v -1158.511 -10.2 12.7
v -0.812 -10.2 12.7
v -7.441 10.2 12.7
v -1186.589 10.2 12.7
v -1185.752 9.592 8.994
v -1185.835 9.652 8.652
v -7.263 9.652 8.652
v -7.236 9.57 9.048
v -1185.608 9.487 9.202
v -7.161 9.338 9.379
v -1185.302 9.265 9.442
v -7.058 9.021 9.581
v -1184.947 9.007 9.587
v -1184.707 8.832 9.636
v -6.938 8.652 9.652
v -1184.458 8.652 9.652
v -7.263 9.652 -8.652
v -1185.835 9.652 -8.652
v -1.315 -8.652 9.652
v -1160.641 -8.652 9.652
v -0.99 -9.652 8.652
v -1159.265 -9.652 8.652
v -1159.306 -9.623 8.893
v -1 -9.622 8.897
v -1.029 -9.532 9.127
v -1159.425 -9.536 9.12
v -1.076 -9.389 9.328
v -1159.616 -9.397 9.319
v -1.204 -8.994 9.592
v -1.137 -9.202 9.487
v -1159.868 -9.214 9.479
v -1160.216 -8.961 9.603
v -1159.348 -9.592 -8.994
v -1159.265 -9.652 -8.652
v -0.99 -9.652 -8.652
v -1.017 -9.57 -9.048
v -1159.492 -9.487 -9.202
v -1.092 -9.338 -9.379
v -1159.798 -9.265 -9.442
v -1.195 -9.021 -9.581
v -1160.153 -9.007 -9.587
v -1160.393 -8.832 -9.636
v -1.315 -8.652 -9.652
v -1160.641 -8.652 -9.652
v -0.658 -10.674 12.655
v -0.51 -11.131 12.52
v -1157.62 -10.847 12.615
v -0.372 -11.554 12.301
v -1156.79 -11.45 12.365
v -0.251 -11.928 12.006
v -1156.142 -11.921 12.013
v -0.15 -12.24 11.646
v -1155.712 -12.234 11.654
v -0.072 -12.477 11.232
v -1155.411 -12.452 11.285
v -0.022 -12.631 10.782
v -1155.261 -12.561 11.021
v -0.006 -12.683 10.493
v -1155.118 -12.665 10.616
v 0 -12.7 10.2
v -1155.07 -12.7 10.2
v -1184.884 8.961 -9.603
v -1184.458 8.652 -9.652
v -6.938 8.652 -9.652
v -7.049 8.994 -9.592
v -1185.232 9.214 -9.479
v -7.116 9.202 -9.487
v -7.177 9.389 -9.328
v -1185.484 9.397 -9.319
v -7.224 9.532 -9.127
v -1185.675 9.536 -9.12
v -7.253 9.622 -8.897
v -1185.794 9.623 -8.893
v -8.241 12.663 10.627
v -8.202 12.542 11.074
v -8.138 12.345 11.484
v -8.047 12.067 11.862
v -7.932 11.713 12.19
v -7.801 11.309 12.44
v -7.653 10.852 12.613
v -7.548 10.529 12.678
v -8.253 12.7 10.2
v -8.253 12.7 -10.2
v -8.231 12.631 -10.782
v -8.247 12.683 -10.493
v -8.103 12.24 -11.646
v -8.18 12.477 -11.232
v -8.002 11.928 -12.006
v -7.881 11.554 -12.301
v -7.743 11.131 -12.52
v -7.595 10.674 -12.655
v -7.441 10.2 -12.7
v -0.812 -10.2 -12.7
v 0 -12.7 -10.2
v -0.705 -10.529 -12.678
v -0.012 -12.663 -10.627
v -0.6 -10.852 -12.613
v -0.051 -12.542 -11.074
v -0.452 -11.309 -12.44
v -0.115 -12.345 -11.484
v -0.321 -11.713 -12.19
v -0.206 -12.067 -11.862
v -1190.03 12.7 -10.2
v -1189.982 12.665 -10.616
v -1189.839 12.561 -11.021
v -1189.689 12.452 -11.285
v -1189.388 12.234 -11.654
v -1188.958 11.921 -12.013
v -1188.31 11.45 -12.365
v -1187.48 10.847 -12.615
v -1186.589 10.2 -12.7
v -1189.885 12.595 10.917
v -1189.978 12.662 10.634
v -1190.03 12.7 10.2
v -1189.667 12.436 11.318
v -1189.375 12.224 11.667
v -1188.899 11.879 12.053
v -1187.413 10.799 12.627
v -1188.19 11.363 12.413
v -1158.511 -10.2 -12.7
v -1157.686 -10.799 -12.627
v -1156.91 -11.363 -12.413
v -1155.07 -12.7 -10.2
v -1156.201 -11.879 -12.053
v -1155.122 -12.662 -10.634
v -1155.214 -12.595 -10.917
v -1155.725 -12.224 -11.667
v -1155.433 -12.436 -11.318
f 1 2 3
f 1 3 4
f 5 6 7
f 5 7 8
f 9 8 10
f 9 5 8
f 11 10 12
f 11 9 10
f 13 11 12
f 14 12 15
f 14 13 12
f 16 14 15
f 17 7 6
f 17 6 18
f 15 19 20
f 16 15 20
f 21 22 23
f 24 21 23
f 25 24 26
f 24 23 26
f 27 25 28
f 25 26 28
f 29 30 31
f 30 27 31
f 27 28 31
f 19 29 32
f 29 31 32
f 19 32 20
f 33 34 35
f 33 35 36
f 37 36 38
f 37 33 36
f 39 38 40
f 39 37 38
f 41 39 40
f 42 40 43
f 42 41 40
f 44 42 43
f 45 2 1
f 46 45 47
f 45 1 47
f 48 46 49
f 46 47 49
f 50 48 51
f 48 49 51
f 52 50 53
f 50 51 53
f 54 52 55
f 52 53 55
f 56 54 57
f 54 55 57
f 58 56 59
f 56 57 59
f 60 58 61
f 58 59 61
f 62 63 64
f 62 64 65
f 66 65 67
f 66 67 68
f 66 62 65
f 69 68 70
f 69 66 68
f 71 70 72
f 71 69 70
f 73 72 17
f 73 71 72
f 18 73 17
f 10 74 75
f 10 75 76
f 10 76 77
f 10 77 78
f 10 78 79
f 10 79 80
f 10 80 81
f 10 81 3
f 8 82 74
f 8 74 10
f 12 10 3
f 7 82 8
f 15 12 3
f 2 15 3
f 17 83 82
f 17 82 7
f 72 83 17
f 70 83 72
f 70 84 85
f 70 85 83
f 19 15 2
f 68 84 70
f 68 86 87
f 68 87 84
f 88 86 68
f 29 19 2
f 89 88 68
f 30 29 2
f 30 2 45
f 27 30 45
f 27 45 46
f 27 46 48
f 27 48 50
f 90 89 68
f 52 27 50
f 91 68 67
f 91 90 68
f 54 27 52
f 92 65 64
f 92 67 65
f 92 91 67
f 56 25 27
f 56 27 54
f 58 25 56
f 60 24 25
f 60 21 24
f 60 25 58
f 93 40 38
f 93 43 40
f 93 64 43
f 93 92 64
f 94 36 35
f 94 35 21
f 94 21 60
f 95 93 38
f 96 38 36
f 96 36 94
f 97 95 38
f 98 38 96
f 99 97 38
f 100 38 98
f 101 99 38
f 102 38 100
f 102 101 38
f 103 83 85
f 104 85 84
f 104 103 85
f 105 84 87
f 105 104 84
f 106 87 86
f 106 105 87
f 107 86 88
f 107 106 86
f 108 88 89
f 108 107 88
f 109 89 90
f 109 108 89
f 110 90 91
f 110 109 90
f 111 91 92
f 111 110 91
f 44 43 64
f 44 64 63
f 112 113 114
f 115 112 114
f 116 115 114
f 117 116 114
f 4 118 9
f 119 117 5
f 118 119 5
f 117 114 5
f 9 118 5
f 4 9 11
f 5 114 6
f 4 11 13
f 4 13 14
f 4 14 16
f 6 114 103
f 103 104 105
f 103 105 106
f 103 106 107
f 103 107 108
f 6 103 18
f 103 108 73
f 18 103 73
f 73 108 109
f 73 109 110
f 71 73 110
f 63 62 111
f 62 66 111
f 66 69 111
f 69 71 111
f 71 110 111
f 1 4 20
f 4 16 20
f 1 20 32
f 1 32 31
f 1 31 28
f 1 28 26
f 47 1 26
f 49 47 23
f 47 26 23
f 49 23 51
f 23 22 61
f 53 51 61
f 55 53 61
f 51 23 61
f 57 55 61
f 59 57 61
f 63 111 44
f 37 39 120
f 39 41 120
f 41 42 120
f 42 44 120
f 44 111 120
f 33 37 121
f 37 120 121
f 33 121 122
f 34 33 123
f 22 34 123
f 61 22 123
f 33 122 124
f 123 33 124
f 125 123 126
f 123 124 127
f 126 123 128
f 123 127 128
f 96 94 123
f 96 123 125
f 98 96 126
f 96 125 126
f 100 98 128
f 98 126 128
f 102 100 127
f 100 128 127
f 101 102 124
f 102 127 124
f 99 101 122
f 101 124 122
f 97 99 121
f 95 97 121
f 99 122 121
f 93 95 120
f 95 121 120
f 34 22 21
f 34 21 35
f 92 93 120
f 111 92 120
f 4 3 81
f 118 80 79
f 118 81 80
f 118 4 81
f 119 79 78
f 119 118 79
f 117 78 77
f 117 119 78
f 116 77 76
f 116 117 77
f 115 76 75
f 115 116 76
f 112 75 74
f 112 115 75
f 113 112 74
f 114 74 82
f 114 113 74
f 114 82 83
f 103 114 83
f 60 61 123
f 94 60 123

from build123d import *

# Parameters (mm, degrees)
SKETCH3_W           = 25.4
SKETCH3_H           = 25.4
SKETCH3_W_2         = 19.304
SKETCH3_H_2         = 19.304
BOSS_EXTRUDE1_DEPTH = 1190.03
FILLET1_R           = 2.5
FILLET2_R           = 1
CUT_EXTRUDE1_DEPTH  = 1191.368787771


with BuildPart() as part:
    # Sketch3 → Boss-Extrude1 (new body)
    with BuildSketch(Plane(origin=(0, 0, 0), x_dir=(0, 0, -1), z_dir=(1, 0, 0))):
        Rectangle(SKETCH3_W, SKETCH3_H)
        Rectangle(SKETCH3_W_2, SKETCH3_H_2, mode=Mode.SUBTRACT)
    extrude(amount=-BOSS_EXTRUDE1_DEPTH)

    # Fillet1
    fillet1_edges = [part.edges().sort_by_distance(p)[0] for p in [
        (-595.015, -12.7, -12.7),
        (-595.015, -12.7, 12.7),
        (-595.015, 12.7, 12.7),
        (-595.015, 12.7, -12.7),
    ]]
    fillet(fillet1_edges, radius=FILLET1_R)

    # Fillet2
    fillet2_edges = [part.edges().sort_by_distance(p)[0] for p in [
        (-595.015, 9.652, -9.652),
        (-595.015, -9.652, -9.652),
        (-595.015, -9.652, 9.652),
        (-595.015, 9.652, 9.652),
    ]]
    fillet(fillet2_edges, radius=FILLET2_R)

    # Sketch5 → Cut-Extrude1 (cut, through all)
    with BuildSketch(Plane(origin=(0, 0, -12.7), x_dir=(-1, 0, 0), z_dir=(0, 0, -1))):
        Polygon((1190.03, 12.7), (1155.06989922, -12.7), (1190.03, -12.7), align=None)
        Polygon((0, 12.7), (8.252960284, 12.7), (0, -12.7), align=None)
    extrude(amount=-CUT_EXTRUDE1_DEPTH, mode=Mode.SUBTRACT)


solid = part.part
